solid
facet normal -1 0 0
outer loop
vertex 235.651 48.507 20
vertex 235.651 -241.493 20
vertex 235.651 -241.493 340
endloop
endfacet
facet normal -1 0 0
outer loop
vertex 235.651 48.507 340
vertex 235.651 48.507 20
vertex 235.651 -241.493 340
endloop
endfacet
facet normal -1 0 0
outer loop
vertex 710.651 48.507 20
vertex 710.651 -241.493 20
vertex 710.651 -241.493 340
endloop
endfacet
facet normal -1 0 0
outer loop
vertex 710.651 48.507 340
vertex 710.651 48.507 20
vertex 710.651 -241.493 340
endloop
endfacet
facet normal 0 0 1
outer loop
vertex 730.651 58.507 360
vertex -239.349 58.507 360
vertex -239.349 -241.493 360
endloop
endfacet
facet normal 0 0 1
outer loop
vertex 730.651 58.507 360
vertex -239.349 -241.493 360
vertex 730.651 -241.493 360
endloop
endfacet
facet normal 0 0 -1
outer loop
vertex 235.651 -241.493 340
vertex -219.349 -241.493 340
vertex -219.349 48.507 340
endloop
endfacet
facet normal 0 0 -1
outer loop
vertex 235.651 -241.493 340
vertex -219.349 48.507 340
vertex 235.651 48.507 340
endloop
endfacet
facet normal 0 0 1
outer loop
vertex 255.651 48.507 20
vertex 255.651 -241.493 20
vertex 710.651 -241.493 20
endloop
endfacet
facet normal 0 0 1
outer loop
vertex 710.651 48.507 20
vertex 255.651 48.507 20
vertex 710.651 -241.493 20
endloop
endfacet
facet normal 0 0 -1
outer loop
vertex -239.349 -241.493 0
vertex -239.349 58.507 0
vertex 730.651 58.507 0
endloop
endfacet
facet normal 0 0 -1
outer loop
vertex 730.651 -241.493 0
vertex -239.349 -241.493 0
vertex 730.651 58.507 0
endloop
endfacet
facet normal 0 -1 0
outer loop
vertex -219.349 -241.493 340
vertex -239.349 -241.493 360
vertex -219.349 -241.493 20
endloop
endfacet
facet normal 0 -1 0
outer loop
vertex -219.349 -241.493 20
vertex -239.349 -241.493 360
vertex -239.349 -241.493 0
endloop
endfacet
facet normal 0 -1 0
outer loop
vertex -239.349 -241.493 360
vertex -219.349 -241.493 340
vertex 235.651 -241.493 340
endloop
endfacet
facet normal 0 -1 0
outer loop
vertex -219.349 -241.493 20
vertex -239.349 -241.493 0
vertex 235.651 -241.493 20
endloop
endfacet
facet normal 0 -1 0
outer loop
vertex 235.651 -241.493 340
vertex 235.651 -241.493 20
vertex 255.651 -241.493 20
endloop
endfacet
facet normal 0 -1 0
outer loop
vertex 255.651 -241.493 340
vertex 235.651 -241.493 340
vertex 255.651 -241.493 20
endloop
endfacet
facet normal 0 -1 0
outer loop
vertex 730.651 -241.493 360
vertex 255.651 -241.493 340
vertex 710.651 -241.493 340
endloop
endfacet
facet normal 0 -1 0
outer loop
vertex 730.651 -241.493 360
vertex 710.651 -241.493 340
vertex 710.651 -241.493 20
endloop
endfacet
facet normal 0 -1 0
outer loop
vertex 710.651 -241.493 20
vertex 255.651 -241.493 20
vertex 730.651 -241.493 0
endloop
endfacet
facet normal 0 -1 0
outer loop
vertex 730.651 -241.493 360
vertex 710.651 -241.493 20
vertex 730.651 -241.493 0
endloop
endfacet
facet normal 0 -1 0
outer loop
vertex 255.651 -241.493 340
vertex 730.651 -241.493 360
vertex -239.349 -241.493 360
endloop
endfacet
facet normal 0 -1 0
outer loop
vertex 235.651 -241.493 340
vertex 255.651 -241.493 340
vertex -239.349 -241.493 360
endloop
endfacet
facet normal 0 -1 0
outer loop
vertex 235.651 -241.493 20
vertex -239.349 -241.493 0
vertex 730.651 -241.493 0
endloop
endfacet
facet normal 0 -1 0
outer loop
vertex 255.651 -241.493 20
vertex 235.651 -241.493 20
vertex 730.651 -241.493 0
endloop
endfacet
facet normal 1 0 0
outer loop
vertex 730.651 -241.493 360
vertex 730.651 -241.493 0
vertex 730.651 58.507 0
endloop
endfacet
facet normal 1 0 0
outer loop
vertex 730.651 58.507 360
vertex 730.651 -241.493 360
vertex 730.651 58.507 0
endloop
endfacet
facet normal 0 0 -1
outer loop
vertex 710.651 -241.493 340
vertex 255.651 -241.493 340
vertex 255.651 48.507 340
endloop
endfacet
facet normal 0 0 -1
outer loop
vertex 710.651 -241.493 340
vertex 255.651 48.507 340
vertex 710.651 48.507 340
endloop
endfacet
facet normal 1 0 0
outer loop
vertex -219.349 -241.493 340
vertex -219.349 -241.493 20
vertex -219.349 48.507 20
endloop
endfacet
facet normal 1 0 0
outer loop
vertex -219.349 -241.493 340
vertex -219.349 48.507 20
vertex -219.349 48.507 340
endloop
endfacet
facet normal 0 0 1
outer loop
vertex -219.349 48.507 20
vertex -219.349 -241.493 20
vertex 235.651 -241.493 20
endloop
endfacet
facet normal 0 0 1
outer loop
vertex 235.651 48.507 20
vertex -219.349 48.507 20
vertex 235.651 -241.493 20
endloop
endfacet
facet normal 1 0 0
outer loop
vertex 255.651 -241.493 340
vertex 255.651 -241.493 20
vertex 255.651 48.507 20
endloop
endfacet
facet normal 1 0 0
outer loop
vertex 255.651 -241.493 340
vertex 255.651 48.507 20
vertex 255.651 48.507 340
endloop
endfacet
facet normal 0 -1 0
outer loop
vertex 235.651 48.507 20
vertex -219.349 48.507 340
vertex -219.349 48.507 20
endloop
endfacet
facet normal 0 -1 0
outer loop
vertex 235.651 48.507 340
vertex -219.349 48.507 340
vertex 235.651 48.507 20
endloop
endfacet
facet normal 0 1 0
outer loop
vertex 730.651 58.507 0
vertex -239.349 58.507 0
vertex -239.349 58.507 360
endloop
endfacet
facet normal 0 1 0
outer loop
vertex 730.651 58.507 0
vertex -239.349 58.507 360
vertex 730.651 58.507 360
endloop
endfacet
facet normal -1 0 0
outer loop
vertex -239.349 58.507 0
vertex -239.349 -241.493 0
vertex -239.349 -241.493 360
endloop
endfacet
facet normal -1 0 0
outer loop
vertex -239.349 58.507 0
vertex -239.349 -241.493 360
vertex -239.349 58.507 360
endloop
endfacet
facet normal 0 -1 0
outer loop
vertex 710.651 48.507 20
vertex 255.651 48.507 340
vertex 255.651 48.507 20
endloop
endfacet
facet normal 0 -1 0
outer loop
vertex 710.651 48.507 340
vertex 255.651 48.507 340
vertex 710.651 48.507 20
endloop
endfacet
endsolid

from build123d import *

# Parameters (mm, degrees)
F0_W     = 970
F0_H     = 300
F1_DEPTH = 360
F2_W     = 455
F2_H     = 320
F3_DEPTH = 290
F4_W     = 455
F4_H     = 320
F5_DEPTH = 290


with BuildPart() as f1:
    # F0 (on Top) → F1 (new body)
    with BuildSketch(Plane.XY):
        with Locations((245.651422, -91.493237)):
            Rectangle(F0_W, F0_H)
    extrude(amount=F1_DEPTH)

    # F2 (on face) → F3 (cut)
    with BuildSketch(Plane.XZ.offset(241.493237)):
        with Locations((8.151422, 180)):
            Rectangle(F2_W, F2_H)
    extrude(amount=-F3_DEPTH, mode=Mode.SUBTRACT)

    # F4 (on face) → F5 (cut)
    with BuildSketch(Plane.XZ.offset(241.493237)):
        with Locations((483.151422, 180)):
            Rectangle(F4_W, F4_H)
    extrude(amount=-F5_DEPTH, mode=Mode.SUBTRACT)


solid = f1.part
